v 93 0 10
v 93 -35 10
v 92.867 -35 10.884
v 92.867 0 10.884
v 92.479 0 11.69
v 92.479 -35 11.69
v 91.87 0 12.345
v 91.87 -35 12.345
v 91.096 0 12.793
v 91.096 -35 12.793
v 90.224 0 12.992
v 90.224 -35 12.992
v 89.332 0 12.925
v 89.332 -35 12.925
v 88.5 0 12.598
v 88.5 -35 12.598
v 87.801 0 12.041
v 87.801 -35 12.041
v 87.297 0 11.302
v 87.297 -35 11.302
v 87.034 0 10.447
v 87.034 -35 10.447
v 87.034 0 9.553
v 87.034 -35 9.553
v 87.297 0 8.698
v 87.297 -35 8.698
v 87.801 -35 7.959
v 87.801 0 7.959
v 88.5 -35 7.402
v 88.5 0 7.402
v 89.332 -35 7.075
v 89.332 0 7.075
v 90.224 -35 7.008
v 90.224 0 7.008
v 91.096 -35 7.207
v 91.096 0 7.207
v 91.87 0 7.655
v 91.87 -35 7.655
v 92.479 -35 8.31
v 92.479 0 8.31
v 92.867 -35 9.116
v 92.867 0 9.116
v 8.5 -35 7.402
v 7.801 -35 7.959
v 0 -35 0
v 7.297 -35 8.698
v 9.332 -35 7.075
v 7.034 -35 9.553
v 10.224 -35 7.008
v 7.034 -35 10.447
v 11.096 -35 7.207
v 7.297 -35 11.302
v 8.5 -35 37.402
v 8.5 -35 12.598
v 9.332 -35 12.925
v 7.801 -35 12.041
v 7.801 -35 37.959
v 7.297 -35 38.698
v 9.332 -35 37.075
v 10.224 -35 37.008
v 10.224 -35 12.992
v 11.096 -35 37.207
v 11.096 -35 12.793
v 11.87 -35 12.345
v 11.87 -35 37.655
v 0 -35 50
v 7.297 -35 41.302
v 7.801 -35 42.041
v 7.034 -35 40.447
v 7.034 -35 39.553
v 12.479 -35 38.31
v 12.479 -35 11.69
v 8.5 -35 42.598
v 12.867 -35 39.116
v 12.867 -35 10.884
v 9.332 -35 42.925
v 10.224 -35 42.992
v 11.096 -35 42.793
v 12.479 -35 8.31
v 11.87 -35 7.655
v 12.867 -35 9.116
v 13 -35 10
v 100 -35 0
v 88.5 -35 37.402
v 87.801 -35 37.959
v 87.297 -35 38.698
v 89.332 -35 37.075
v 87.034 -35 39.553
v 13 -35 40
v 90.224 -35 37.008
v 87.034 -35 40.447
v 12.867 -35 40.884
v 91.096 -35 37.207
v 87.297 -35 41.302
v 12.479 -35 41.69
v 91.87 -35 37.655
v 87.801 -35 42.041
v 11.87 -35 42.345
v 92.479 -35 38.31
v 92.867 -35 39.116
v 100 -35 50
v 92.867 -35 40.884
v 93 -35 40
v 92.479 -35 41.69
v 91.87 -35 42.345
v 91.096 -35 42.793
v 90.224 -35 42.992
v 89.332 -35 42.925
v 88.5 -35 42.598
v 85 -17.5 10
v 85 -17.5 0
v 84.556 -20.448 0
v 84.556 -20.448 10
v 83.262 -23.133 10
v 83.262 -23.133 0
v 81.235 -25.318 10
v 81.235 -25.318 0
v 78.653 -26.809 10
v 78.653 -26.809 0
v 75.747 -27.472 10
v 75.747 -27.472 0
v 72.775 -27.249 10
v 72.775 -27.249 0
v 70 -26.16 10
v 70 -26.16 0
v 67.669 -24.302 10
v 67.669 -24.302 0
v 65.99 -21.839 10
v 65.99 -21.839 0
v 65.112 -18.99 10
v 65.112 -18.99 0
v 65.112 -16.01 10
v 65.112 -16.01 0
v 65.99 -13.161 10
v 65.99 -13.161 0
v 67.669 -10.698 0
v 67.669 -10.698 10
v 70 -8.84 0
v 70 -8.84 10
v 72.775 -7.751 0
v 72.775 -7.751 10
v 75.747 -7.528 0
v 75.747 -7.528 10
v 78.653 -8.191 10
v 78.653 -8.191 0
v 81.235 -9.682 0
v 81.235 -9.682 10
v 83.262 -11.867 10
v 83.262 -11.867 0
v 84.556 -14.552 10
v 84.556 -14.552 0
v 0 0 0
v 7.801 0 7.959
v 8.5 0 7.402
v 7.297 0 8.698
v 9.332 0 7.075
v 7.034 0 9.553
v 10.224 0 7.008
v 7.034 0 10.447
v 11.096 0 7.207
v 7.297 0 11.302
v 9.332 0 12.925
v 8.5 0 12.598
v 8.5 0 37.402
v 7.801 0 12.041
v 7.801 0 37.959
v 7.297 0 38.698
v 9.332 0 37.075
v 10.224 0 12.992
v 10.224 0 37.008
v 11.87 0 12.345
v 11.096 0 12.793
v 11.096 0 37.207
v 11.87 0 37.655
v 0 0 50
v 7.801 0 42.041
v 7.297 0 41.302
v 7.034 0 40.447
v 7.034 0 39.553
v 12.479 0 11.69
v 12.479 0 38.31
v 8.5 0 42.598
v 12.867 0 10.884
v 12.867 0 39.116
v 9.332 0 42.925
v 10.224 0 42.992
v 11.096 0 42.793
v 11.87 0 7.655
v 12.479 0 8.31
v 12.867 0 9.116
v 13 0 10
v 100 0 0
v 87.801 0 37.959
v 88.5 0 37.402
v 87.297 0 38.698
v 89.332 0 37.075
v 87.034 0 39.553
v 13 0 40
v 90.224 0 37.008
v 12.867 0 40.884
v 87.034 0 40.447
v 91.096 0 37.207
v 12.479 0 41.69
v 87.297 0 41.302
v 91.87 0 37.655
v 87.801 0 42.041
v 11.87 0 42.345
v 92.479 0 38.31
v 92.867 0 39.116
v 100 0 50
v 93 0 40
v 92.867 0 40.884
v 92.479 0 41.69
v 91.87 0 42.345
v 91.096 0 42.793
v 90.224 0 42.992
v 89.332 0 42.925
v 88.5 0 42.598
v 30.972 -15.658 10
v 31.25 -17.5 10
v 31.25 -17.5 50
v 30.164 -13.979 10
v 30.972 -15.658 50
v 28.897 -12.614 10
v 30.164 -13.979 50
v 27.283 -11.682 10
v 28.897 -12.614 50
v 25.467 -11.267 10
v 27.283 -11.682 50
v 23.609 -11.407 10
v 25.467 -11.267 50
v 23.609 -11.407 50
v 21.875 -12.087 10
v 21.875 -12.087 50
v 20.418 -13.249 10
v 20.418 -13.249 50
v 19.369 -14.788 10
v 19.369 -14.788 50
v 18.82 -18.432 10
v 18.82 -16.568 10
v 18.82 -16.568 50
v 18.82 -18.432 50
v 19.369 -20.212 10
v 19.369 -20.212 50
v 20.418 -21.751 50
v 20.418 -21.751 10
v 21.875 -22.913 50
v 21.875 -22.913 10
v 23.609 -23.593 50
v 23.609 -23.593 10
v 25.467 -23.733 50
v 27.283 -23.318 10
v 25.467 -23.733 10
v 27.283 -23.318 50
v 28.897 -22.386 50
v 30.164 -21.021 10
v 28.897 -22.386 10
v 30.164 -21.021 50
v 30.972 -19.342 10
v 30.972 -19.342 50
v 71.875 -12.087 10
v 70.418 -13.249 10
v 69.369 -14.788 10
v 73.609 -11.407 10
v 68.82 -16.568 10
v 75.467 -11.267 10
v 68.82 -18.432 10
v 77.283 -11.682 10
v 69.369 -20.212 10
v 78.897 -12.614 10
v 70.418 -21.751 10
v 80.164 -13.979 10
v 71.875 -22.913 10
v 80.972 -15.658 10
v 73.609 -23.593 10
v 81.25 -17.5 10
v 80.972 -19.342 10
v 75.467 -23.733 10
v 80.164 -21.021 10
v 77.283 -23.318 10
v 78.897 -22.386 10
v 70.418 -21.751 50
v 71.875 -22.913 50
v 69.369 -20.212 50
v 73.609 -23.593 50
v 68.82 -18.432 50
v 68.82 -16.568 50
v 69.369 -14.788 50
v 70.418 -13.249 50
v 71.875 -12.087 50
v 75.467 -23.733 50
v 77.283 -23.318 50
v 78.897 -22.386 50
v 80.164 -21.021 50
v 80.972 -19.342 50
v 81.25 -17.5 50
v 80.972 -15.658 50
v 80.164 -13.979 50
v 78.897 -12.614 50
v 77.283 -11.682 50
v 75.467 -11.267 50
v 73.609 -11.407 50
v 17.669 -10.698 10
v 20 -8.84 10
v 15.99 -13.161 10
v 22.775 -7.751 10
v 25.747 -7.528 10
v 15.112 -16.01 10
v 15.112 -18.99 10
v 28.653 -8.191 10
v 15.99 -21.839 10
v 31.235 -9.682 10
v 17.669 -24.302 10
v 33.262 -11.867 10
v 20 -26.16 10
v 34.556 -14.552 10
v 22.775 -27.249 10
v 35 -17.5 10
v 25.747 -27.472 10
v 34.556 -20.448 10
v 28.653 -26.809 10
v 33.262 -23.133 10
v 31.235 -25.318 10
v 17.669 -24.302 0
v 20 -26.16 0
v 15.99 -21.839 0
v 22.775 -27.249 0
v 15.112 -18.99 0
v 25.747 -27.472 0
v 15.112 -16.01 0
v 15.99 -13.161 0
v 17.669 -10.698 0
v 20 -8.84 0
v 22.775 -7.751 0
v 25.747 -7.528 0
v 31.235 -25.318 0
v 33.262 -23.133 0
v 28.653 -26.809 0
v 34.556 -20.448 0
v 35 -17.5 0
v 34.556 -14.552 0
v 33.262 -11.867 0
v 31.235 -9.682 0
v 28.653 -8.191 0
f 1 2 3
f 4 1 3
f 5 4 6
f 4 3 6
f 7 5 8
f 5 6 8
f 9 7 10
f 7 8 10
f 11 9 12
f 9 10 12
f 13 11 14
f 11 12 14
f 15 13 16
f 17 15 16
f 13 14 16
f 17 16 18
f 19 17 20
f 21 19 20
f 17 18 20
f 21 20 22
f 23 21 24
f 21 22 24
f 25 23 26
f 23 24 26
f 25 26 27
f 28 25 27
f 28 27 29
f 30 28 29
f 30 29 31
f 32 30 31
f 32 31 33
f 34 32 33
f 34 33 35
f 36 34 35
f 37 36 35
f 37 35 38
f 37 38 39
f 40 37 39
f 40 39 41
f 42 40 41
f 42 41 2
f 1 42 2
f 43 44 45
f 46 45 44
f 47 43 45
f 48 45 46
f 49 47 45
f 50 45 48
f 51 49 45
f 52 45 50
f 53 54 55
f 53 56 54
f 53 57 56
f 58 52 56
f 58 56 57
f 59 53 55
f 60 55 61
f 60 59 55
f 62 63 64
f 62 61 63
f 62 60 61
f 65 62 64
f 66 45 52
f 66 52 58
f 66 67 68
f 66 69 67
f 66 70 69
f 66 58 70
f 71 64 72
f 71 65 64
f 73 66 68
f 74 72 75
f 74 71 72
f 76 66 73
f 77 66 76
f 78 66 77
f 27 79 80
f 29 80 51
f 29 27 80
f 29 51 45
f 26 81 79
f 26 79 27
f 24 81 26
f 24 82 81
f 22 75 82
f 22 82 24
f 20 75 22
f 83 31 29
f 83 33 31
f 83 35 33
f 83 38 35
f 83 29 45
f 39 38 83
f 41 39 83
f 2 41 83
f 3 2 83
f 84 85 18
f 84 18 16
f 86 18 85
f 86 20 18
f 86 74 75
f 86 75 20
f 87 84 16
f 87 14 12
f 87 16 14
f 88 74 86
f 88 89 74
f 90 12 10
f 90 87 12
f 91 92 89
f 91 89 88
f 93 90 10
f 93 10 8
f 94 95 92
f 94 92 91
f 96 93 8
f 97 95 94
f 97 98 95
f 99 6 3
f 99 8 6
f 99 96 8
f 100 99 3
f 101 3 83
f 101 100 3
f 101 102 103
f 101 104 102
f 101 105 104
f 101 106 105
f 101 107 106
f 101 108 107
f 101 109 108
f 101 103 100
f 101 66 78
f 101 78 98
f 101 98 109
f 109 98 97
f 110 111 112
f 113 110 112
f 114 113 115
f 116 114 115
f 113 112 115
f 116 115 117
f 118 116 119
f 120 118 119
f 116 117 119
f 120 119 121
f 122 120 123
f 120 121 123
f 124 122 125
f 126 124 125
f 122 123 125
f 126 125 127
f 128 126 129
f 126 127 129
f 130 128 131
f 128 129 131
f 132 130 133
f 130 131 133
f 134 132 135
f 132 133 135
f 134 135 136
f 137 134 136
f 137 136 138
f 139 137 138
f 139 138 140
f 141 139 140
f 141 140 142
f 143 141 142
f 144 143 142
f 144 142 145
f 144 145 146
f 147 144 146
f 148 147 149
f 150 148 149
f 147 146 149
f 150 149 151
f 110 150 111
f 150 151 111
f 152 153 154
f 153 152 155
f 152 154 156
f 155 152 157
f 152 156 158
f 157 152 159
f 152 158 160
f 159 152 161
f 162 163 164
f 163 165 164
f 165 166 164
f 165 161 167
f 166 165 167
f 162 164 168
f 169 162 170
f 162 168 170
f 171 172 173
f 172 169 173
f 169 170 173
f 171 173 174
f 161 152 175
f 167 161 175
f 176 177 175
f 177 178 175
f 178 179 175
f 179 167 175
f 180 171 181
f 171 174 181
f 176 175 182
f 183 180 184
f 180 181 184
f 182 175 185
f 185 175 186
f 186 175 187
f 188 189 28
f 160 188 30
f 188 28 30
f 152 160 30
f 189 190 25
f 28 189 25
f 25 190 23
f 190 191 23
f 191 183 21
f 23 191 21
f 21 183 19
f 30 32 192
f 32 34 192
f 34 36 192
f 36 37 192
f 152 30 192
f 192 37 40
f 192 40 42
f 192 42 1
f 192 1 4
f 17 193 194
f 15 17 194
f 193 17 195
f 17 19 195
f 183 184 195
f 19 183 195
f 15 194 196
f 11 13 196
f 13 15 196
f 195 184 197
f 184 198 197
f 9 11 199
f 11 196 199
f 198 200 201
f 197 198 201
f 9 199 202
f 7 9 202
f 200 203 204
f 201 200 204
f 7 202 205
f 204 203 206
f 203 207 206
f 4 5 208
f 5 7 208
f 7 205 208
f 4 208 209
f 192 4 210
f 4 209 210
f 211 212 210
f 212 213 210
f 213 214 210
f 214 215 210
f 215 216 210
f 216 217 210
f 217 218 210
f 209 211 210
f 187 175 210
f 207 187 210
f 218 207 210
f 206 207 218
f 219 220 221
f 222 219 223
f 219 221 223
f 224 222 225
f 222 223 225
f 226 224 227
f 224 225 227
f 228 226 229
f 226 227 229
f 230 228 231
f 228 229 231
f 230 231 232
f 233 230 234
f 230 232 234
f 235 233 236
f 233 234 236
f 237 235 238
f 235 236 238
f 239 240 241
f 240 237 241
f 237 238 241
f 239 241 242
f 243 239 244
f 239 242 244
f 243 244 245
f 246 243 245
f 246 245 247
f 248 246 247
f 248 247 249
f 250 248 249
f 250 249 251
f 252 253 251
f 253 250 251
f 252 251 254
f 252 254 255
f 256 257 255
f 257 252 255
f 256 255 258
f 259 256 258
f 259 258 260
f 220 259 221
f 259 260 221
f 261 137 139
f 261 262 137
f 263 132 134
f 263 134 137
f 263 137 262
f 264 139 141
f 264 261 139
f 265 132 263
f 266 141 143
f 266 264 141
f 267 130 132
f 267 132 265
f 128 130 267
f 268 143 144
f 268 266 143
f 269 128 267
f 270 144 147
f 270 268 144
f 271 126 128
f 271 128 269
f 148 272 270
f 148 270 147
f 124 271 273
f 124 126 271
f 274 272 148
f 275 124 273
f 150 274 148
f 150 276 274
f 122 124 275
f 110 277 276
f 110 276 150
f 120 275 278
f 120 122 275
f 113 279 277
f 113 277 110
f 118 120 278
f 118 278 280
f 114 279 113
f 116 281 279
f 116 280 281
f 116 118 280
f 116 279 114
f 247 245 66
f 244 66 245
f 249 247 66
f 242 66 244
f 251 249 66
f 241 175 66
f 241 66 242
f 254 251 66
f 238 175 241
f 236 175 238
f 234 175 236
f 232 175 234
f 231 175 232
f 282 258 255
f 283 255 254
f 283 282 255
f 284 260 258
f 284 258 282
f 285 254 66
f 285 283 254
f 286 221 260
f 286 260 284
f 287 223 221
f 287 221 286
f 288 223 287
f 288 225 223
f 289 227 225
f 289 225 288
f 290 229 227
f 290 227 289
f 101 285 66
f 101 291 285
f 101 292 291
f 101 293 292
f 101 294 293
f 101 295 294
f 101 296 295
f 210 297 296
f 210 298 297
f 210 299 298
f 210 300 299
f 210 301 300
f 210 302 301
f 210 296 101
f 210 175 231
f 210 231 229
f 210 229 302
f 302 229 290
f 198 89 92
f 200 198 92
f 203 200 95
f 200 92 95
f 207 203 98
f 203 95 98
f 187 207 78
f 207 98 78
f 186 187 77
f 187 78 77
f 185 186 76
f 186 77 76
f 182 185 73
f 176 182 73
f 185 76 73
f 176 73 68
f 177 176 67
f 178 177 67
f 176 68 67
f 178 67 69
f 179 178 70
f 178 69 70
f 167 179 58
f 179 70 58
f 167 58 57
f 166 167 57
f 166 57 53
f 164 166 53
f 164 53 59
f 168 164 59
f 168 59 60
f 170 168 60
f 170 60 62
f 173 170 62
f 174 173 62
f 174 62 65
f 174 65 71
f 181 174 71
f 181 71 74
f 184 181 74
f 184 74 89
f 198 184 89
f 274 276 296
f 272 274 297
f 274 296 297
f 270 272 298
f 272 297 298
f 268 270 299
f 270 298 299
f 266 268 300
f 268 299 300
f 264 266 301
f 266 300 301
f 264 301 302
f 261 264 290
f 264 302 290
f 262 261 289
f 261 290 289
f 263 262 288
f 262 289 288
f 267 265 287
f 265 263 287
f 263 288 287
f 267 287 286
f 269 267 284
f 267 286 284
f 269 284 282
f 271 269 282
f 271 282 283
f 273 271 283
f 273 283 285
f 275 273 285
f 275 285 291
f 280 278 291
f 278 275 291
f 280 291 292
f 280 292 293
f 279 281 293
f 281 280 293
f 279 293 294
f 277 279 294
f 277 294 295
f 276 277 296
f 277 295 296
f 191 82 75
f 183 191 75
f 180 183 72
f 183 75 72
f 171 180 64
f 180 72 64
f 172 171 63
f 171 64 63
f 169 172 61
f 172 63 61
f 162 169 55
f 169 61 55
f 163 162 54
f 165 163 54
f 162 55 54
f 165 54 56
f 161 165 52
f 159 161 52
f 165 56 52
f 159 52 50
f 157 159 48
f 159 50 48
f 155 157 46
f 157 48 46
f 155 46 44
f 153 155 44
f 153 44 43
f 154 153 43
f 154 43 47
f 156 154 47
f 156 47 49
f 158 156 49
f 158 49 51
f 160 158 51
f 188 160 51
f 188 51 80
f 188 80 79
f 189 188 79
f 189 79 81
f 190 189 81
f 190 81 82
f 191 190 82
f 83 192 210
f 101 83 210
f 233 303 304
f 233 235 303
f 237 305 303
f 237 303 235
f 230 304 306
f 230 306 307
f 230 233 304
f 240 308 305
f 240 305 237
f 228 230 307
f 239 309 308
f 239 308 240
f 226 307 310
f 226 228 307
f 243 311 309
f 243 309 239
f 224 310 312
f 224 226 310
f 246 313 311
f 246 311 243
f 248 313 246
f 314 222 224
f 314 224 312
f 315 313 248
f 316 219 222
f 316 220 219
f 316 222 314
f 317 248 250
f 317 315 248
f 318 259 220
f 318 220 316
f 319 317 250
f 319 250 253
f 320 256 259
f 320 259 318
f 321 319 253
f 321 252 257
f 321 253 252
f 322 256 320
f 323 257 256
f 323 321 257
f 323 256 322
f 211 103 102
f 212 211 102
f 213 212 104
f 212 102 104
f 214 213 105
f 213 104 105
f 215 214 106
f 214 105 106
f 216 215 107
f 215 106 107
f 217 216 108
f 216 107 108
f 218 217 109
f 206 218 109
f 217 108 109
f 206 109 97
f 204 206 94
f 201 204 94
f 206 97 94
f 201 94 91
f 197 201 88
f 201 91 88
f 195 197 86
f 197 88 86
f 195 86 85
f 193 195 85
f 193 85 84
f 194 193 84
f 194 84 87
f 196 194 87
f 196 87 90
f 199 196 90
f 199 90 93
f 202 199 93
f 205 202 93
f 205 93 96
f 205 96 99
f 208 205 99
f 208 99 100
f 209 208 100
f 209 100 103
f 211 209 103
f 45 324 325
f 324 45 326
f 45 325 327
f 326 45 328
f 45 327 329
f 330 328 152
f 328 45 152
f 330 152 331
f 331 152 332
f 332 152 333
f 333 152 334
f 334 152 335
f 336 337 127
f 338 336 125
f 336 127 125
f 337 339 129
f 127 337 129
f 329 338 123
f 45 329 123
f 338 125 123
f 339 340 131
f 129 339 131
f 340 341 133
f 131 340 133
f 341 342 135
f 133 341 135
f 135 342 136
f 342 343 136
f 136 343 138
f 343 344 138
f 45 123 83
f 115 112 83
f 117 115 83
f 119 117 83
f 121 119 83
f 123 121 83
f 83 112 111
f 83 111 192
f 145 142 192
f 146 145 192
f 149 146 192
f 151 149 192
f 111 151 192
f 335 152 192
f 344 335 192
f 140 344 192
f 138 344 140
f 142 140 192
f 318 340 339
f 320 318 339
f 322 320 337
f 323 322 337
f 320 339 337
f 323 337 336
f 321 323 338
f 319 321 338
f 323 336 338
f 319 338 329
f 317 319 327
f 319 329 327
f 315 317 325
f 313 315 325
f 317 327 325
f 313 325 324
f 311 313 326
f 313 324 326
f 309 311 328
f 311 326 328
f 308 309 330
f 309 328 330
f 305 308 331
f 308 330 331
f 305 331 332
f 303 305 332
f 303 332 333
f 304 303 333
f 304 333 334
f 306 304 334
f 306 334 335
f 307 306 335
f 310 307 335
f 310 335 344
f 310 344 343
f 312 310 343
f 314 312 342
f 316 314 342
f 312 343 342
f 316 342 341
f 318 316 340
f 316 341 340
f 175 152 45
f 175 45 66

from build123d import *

# Parameters (mm, degrees)
F0_W     = 100
F0_H     = 50
F1_DEPTH = 35
F2_R     = 6.25
F3_DEPTH = 50.001
F5_D     = 6
F6_R     = 10
F6_R_2   = 6.25
F7_DEPTH = 10


with BuildPart() as f1:
    # F0 (on Front) → F1 (new body)
    with BuildSketch(Plane.XZ):
        with Locations((50, 25)):
            Rectangle(F0_W, F0_H)
    extrude(amount=F1_DEPTH)

    # F2 (on face) → F3 (cut, through all)
    with BuildSketch(Plane.XY.offset(50)):
        with Locations((25, -17.5)):
            Circle(F2_R)
        with Locations((75, -17.5)):
            Circle(F2_R)
    extrude(amount=-F3_DEPTH, mode=Mode.SUBTRACT)

    # F5 (through all)
    with Locations(Plane(origin=(0, 0, 0), x_dir=(-1, 0, 0), z_dir=(0, 1, 0))):
        with Locations((-90, 40), (-10, 40), (-10, 10), (-90, 10)):
            Hole(F5_D / 2)

    # F6 (on face) → F7 (cut)
    with BuildSketch(Plane(origin=(0, 0, 0), x_dir=(1, 0, 0), z_dir=(0, 0, -1))):
        with Locations((25, 17.5)):
            Circle(F6_R)
        with Locations((25, 17.5)):
            Circle(F6_R_2, mode=Mode.SUBTRACT)
        with Locations((75, 17.5)):
            Circle(F6_R)
        with Locations((75, 17.5)):
            Circle(F6_R_2, mode=Mode.SUBTRACT)
    extrude(amount=-F7_DEPTH, mode=Mode.SUBTRACT)


solid = f1.part
